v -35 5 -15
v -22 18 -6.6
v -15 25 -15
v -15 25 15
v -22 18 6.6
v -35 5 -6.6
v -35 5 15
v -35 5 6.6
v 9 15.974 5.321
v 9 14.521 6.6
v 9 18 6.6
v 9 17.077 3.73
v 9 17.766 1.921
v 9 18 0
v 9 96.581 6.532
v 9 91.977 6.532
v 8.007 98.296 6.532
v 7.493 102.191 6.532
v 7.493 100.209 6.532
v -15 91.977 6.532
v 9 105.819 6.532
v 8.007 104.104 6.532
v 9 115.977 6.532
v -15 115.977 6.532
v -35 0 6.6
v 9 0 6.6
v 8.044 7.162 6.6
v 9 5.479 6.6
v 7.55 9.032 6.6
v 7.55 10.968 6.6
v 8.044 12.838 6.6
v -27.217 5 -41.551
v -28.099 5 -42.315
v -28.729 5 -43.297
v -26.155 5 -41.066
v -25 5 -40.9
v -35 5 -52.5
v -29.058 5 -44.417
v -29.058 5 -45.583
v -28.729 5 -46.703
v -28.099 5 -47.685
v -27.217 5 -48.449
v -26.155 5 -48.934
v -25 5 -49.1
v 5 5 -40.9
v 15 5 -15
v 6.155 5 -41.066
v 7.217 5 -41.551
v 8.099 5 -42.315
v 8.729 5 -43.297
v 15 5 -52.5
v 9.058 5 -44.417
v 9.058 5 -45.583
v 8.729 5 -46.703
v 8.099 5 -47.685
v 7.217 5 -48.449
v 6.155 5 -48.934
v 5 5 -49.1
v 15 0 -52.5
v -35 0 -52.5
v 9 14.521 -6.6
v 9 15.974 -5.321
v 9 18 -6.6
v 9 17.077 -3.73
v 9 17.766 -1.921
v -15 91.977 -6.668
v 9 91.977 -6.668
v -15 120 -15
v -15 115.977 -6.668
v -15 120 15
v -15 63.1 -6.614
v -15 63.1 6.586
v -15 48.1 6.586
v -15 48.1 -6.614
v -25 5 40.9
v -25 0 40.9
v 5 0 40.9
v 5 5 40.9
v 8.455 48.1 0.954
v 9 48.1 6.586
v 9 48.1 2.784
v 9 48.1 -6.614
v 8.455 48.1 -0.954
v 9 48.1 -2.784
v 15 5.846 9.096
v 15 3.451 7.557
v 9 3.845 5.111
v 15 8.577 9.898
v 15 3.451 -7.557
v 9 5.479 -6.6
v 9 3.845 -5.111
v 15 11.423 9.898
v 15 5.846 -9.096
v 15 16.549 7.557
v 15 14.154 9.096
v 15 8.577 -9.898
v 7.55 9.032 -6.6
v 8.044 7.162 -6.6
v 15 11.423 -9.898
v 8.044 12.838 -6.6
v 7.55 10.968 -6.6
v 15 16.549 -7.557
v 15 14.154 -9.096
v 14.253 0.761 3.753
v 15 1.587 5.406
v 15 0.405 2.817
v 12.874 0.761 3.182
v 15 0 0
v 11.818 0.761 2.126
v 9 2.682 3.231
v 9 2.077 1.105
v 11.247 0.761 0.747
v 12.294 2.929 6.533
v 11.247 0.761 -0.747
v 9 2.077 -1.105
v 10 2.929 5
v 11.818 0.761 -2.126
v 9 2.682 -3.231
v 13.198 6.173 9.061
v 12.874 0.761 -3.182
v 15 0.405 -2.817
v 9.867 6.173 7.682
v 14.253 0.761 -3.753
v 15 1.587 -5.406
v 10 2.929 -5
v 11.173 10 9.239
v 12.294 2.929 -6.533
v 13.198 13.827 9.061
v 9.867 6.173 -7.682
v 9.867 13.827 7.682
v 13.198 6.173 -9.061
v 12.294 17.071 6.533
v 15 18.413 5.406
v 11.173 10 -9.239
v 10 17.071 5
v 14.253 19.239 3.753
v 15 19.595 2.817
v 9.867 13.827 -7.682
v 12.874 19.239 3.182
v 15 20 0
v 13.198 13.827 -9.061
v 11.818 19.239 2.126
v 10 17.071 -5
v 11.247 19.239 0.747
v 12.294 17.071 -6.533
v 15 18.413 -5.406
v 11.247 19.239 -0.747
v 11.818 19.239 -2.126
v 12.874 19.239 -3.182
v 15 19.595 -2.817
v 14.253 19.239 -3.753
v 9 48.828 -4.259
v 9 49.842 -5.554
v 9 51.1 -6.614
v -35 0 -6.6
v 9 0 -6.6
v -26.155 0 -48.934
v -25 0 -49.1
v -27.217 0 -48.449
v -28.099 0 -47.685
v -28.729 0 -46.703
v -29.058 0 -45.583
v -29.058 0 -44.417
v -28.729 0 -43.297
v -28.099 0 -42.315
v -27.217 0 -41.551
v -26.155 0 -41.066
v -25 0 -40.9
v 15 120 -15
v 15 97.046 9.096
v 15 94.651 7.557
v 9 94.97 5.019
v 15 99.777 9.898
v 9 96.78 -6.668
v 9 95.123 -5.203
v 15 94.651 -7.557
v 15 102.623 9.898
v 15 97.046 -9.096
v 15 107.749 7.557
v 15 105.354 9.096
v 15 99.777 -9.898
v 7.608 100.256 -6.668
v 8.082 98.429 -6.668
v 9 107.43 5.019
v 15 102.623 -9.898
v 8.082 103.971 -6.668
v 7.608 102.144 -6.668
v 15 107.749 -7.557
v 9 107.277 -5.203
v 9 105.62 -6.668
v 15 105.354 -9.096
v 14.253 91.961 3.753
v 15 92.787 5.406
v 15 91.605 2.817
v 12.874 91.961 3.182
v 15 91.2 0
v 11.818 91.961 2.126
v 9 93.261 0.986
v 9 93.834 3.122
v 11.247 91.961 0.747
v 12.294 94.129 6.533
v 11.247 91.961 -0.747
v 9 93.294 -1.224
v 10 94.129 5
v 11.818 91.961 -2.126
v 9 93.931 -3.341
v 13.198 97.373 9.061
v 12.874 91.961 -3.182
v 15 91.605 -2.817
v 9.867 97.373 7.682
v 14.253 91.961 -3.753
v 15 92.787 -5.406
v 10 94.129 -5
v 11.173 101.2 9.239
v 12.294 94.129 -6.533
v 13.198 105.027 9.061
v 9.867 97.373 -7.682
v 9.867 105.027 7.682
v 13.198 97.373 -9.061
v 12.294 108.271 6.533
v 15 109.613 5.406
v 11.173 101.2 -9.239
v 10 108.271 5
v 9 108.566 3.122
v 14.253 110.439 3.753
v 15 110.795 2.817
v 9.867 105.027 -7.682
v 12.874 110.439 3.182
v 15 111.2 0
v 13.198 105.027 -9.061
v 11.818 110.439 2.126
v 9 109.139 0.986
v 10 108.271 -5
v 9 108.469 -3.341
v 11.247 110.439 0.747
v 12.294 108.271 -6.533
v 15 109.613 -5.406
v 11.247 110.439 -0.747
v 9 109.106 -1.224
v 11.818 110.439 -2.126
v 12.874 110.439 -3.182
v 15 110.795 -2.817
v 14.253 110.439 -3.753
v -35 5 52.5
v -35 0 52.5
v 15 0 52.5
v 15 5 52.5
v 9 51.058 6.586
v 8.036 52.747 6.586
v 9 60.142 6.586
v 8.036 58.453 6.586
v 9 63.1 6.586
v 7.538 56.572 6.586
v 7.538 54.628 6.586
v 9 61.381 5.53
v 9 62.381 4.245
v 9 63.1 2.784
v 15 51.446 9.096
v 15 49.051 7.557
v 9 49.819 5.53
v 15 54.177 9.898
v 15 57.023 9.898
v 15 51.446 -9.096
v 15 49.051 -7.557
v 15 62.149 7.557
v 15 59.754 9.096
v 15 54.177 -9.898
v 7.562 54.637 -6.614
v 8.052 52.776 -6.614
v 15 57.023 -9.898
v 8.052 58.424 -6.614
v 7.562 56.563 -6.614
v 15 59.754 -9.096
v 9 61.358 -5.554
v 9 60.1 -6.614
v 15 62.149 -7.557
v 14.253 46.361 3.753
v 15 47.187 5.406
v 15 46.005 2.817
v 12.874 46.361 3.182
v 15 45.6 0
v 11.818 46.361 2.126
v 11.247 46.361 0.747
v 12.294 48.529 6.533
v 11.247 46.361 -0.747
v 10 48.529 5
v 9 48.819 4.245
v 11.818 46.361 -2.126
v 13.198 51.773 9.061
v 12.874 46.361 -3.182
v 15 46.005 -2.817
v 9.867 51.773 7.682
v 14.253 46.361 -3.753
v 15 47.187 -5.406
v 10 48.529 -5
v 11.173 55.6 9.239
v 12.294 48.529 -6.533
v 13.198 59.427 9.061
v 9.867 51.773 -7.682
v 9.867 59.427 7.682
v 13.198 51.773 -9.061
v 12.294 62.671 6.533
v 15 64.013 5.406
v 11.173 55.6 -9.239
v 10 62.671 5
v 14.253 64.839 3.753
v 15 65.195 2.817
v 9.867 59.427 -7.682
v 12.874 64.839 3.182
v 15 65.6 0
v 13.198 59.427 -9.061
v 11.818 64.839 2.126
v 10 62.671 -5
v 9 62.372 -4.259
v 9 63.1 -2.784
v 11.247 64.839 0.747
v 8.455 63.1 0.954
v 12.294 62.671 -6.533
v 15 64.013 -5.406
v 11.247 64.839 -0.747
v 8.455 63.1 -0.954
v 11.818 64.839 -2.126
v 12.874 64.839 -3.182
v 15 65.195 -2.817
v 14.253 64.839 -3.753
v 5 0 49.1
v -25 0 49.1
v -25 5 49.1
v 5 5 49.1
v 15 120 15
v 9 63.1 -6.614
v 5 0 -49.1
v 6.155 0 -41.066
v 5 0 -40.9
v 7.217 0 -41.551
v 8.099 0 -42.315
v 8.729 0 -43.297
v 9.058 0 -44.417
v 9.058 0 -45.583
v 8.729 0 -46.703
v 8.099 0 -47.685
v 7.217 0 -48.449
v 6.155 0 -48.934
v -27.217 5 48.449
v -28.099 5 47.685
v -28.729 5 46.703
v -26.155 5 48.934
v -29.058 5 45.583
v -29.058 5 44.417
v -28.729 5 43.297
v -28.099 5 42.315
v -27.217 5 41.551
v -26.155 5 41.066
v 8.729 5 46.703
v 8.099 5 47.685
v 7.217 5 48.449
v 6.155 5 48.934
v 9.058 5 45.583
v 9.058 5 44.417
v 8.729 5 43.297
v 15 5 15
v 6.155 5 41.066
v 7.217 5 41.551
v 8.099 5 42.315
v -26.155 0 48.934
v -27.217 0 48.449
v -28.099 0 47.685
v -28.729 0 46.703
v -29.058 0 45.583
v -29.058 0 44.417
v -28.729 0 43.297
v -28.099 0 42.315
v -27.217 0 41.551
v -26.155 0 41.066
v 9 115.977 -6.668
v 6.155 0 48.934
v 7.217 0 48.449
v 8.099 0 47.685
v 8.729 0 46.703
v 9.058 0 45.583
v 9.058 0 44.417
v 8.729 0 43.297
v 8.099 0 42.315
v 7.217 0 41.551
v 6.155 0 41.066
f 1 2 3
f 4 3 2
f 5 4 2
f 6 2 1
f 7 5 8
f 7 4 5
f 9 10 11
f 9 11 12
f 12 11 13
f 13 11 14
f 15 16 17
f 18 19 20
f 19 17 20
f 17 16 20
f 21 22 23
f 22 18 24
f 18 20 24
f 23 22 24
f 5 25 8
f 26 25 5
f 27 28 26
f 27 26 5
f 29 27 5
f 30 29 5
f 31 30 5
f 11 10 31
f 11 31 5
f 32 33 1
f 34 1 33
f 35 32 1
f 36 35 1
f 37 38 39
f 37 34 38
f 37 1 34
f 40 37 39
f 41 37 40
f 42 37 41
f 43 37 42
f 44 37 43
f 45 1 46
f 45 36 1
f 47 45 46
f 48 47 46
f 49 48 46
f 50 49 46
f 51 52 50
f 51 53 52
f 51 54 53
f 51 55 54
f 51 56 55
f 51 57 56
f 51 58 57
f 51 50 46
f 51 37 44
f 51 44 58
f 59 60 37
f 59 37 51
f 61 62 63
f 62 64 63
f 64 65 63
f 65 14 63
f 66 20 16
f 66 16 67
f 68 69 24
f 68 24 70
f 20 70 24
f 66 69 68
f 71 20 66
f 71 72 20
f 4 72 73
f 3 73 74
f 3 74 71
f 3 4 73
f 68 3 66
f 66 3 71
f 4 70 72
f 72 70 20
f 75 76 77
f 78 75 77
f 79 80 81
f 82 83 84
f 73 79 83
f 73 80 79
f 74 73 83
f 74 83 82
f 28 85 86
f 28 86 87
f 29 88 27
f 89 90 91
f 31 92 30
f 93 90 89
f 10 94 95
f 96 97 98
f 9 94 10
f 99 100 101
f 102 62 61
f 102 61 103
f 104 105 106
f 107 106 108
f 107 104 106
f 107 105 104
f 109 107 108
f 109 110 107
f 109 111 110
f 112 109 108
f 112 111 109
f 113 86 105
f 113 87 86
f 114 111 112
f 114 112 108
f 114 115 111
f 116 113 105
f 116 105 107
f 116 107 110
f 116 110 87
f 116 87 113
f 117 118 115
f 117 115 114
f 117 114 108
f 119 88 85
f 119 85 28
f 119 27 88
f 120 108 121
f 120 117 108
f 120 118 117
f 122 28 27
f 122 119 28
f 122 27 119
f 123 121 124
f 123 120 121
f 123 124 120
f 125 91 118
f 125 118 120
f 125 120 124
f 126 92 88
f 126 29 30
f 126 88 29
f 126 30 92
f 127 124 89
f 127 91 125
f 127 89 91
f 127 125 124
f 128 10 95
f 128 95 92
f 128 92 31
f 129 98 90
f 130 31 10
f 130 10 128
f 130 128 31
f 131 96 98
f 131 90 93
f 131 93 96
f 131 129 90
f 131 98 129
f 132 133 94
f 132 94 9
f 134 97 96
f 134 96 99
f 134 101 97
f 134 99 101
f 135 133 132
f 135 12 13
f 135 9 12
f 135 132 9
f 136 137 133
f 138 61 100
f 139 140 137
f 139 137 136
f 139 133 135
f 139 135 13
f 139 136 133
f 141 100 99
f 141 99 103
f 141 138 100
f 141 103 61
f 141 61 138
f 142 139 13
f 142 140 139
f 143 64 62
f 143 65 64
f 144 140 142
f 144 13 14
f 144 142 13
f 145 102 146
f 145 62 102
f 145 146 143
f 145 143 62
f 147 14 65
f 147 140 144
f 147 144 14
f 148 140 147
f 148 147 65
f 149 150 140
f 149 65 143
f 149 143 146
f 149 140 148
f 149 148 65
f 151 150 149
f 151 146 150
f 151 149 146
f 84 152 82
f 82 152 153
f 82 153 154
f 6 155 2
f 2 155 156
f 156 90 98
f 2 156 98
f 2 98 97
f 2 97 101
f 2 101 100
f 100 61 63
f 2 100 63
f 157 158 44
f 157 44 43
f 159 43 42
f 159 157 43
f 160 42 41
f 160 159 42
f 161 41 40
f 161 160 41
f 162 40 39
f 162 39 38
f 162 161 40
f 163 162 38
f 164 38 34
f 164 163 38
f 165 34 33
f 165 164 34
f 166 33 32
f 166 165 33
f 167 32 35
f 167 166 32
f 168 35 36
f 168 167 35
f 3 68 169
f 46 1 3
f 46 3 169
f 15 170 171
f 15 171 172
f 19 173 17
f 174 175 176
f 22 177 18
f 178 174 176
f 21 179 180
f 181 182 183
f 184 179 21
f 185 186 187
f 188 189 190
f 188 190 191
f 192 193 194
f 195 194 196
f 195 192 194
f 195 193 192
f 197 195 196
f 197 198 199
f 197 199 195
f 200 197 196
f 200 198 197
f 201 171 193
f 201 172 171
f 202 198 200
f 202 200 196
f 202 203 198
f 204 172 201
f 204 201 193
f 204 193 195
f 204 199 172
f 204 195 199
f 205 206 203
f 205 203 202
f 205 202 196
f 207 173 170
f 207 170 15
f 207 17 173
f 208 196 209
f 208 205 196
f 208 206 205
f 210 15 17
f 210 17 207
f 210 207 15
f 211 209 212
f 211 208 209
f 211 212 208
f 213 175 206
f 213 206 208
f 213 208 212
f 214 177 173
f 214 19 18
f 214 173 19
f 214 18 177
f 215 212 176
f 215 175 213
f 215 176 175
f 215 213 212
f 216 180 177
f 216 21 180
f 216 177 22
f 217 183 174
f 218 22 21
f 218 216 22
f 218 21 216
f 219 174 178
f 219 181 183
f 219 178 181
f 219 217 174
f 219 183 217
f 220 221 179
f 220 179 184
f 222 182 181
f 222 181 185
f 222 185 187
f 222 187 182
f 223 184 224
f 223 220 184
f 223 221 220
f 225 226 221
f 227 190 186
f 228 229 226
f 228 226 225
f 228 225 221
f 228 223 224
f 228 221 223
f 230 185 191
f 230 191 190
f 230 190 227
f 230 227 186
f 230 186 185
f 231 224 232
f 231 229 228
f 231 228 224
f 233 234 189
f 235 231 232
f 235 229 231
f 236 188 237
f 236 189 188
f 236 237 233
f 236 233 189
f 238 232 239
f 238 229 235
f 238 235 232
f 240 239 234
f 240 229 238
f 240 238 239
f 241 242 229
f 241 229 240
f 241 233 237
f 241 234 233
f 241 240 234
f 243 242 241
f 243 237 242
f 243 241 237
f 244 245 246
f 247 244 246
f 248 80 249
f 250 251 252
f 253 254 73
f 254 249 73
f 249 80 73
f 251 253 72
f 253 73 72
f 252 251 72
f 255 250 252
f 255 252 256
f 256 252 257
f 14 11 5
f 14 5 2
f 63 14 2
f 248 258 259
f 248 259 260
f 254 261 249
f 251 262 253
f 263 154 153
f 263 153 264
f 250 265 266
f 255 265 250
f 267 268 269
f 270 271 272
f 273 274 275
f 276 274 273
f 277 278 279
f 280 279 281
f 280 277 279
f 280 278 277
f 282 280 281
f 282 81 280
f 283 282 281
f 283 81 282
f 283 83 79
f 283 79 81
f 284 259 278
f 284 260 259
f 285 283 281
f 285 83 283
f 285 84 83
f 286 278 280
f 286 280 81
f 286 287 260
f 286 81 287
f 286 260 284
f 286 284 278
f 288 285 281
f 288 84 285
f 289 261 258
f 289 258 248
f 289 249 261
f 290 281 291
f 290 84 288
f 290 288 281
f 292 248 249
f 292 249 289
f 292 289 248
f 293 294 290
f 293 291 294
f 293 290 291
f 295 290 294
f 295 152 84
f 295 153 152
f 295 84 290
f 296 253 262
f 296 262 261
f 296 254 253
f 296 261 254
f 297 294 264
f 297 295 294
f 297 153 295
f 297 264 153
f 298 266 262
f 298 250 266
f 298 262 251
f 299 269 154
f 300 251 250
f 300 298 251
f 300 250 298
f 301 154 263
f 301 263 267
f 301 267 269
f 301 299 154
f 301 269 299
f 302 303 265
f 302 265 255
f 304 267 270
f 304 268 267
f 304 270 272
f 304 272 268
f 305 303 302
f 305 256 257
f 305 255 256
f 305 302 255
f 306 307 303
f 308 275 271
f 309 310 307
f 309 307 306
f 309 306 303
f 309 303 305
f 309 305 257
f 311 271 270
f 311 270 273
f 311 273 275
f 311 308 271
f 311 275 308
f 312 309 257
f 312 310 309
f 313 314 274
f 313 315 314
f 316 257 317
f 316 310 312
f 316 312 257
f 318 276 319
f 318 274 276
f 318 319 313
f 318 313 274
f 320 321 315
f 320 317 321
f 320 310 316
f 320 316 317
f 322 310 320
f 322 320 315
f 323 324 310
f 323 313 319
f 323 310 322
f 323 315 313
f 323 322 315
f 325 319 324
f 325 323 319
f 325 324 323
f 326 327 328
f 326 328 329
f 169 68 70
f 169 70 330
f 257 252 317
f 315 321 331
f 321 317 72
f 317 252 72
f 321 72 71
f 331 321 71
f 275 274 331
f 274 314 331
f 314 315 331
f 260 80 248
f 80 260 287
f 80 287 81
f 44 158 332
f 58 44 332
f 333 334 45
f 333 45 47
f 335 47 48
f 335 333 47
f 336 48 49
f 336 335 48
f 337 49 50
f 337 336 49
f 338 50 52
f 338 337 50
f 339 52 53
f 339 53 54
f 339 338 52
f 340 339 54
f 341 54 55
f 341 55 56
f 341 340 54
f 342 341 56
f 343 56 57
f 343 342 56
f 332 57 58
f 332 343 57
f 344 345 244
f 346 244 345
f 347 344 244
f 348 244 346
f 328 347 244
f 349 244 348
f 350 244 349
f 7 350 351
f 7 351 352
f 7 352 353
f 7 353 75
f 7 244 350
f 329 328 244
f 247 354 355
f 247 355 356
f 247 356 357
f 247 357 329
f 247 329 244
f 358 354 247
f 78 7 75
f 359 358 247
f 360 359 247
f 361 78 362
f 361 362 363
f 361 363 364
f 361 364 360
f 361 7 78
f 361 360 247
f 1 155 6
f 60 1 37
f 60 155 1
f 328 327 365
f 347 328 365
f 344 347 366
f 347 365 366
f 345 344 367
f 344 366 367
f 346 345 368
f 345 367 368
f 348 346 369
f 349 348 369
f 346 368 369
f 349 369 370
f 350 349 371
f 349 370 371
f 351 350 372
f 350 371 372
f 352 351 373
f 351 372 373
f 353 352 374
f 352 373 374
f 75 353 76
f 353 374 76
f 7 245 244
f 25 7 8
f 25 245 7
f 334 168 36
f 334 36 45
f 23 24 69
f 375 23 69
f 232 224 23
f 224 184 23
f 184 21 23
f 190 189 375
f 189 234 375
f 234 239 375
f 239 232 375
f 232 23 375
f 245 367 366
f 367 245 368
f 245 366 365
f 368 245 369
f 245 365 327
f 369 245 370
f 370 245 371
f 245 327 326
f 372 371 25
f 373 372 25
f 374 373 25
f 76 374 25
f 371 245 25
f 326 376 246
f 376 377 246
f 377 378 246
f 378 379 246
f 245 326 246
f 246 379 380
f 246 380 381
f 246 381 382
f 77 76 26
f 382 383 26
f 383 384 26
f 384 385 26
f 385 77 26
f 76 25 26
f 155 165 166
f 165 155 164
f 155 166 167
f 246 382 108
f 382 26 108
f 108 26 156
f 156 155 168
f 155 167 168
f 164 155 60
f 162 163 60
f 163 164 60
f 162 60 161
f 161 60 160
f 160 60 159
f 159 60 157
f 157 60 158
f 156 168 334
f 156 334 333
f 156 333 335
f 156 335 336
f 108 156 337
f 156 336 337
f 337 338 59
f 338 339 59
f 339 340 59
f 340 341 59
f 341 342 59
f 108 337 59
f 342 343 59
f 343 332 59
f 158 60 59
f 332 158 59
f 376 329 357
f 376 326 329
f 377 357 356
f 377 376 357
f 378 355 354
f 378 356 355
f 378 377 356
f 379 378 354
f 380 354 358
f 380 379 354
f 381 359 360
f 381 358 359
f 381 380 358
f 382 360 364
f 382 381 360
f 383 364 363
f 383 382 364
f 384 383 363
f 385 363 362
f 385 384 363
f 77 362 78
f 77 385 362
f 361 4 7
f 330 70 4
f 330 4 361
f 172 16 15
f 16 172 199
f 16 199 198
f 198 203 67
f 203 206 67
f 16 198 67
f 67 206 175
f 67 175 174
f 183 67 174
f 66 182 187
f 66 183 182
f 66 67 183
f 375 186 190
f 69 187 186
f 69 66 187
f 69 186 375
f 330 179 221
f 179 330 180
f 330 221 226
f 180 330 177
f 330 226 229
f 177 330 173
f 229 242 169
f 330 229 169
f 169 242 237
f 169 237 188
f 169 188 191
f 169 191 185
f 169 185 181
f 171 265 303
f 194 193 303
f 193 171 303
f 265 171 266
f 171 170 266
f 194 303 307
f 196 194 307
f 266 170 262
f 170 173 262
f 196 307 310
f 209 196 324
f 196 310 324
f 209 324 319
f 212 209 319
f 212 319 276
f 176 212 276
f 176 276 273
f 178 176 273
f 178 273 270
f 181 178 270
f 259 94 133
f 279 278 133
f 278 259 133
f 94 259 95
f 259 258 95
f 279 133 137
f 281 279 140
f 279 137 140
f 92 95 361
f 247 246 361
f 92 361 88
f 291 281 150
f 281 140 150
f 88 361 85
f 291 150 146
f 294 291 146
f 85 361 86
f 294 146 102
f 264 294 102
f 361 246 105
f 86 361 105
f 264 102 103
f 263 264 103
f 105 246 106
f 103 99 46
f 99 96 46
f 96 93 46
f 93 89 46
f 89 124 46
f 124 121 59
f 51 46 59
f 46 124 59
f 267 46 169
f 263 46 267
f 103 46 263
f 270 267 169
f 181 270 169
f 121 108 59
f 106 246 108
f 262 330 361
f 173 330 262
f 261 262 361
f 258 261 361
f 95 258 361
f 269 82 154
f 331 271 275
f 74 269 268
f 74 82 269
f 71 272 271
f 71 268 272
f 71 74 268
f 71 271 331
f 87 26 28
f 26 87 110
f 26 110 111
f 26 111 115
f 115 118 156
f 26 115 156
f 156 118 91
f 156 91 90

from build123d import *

# Parameters (mm, degrees)
SKETCH_1_W                      = 70
SKETCH_1_H                      = 105
EXTRUDE_1_DEPTH                 = 5
SKETCH_2_W                      = 30
SKETCH_2_H                      = 30
EXTRUDE_2_DEPTH                 = 120
EXTRUDE_3_REACH                 = 137.577
EXTRUDE_3_DIRECTION_2_REACH     = 137.577
SKETCH_8_R                      = 4.1
CUT_EXTRUDE_2_DEPTH             = 5
SKETCH_11_W                     = 20
SKETCH_11_H                     = 105
CUT_EXTRUDE_3_DEPTH             = 5
PATTERN_LINEAR_1_COUNT          = 3
PATTERN_LINEAR_1_PITCH          = 45.6
CUT_EXTRUDE_4_DEPTH             = 9
CUT_EXTRUDE_4_DEPTH_BACK        = 136.57746863
SKETCH_14_W                     = 13.2
SKETCH_14_H                     = 24
PATTERN_LINEAR_3_COUNT          = 2
PATTERN_LINEAR_3_PITCH          = 30
SKETCH_15_W                     = 30
SKETCH_15_H                     = 8.2
CUT_EXTRUDE_5_DEPTH             = 5
MIRROR_4_COPY_1_SKETCH_R        = 4.1
MIRROR_4_COPY_1_DEPTH           = 5
MIRROR_4_COPY_2_SKETCH_R        = 4.1
MIRROR_4_COPY_2_DEPTH           = 5
CUT_EXTRUDE_6_REACH             = 137.577
SKETCH_17_W                     = 13.2
SKETCH_17_H                     = 18
CUT_EXTRUDE_6_DIRECTION_2_DEPTH = 9
CUT_EXTRUDE_7_DEPTH             = 9
CUT_EXTRUDE_7_DEPTH_BACK        = 15
SKETCH_18_W                     = 13.2
SKETCH_18_H                     = 15


with BuildPart() as part:
    # 草图1 → 凸台-拉伸1 (new body)
    with BuildSketch(Plane(origin=(0, 0, 0), x_dir=(1, 0, 0), z_dir=(0, 1, 0))):
        Rectangle(SKETCH_1_W, SKETCH_1_H)
    extrude(amount=EXTRUDE_1_DEPTH)

    # 草图2 → 凸台-拉伸2 (add)
    with BuildSketch(Plane(origin=(0, 0, 0), x_dir=(1, 0, 0), z_dir=(0, 1, 0))):
        Rectangle(SKETCH_2_W, SKETCH_2_H)
    extrude(amount=EXTRUDE_2_DEPTH)

    # 凸台-拉伸3: up to this face of the body (flat: up to its plane)
    extrude_3_end = Plane(part.part.faces().sort_by_distance((0, 62.5, 15))[0])
    # 草图7 → 凸台-拉伸3 (add, up to the picked face)
    with BuildSketch(Plane.XY, mode=Mode.PRIVATE) as extrude_3_sk1:
        Polygon((-15, 25), (-35, 5), (-15, 5), align=None)
    extrude_3_tool1 = split(extrude(extrude_3_sk1.sketch, amount=EXTRUDE_3_REACH, mode=Mode.PRIVATE), bisect_by=extrude_3_end, keep=Keep.BOTH, mode=Mode.PRIVATE)
    add(extrude_3_tool1.solids().sort_by(Axis((-21.666667, 11.666667, 0), (0, 0, 1)))[0])

    # 凸台-拉伸3 direction 2: up to this face of the body (flat: up to its plane)
    extrude_3_direction_2_end = Plane(part.part.faces().sort_by_distance((0, 62.5, -15))[0])
    # 草图7 → 凸台-拉伸3 direction 2 (add, up to the picked face)
    with BuildSketch(Plane.XY, mode=Mode.PRIVATE) as extrude_3_direction_2_sk1:
        Polygon((-15, 25), (-35, 5), (-15, 5), align=None)
    extrude_3_direction_2_tool1 = split(extrude(extrude_3_direction_2_sk1.sketch, amount=-EXTRUDE_3_DIRECTION_2_REACH, mode=Mode.PRIVATE), bisect_by=extrude_3_direction_2_end, keep=Keep.BOTH, mode=Mode.PRIVATE)
    add(extrude_3_direction_2_tool1.solids().sort_by(Axis((-21.666667, 11.666667, 0), (0, 0, -1)))[0])

    # 草图8 → 切除-拉伸2 (cut)
    with BuildSketch(Plane(origin=(0, 0, 0), x_dir=(1, 0, 0), z_dir=(0, 1, 0))):
        with Locations(Location((-25, 45, 0), (0, 0, 270))):
            Circle(SKETCH_8_R)
    cut_extrude_2 = extrude(amount=CUT_EXTRUDE_2_DEPTH, mode=Mode.SUBTRACT)

    # 镜向2: 切除-拉伸2 across plane
    add(cut_extrude_2.mirror(Plane.XY), mode=Mode.SUBTRACT)

    # 草图11 → 切除-拉伸3 (cut)
    with BuildSketch(Plane(origin=(0, 0, 0), x_dir=(1, 0, 0), z_dir=(0, 1, 0))):
        with Locations((25, 0)):
            Rectangle(SKETCH_11_W, SKETCH_11_H)
    extrude(amount=CUT_EXTRUDE_3_DEPTH, mode=Mode.SUBTRACT)

    # 草图12 → 切除-旋转2 (revolve, cut)
    with BuildSketch(Plane.XY):
        with BuildLine():
            Line((15, 20), (15, 0))
            ThreePointArc((15, 0), (5, 10), (15, 20))
        make_face()
    cut_revolve_2 = revolve(axis=Axis((15, 20, 0), (0, -1, 0)), mode=Mode.SUBTRACT)

    # 阵列(线性)1: 切除-旋转2 ×3
    with Locations(*[(0, i * PATTERN_LINEAR_1_PITCH, 0) for i in range(1, PATTERN_LINEAR_1_COUNT)]):
        add(cut_revolve_2, mode=Mode.SUBTRACT)

    # 草图14 → 切除-拉伸4 (cut, two sides: drawn at the far end of the back side and taken through both)
    with BuildSketch(Plane(origin=(0, 0, 0), x_dir=(0, 0, -1), z_dir=(1, 0, 0)).offset(-CUT_EXTRUDE_4_DEPTH_BACK)):
        with Locations((0.067878733, 103.977253559)):
            Rectangle(SKETCH_14_W, SKETCH_14_H)
    extrude(amount=CUT_EXTRUDE_4_DEPTH + CUT_EXTRUDE_4_DEPTH_BACK, mode=Mode.SUBTRACT)

    # 阵列(线性)3: 切除-拉伸2 ×2
    with Locations(*[(i * PATTERN_LINEAR_3_PITCH, 0, 0) for i in range(1, PATTERN_LINEAR_3_COUNT)]):
        add(cut_extrude_2, mode=Mode.SUBTRACT)

    # 草图15 → 切除-拉伸5 (cut)
    with BuildSketch(Plane(origin=(0, 0, 0), x_dir=(1, 0, 0), z_dir=(0, 1, 0))):
        with Locations((-10, 45)):
            Rectangle(SKETCH_15_W, SKETCH_15_H)
    cut_extrude_5 = extrude(amount=CUT_EXTRUDE_5_DEPTH, mode=Mode.SUBTRACT)

    # 镜向3: 切除-拉伸5 across plane
    add(cut_extrude_5.mirror(Plane.XY), mode=Mode.SUBTRACT)

    # 镜向4 copy 1 sketch → 镜向4 copy 1 (cut)
    with BuildSketch(Plane(origin=(30, 0, 0), x_dir=(1, 0, 0), z_dir=(0, 1, 0))):
        with Locations((-25, -45)):
            Circle(MIRROR_4_COPY_1_SKETCH_R)
    extrude(amount=MIRROR_4_COPY_1_DEPTH, mode=Mode.SUBTRACT)

    # 镜向4 copy 2 sketch → 镜向4 copy 2 (cut)
    with BuildSketch(Plane(origin=(0, 0, 0), x_dir=(1, 0, 0), z_dir=(0, 1, 0))):
        with Locations((-25, -45)):
            Circle(MIRROR_4_COPY_2_SKETCH_R)
    extrude(amount=MIRROR_4_COPY_2_DEPTH, mode=Mode.SUBTRACT)

    # 切除-拉伸6: up to this plane
    cut_extrude_6_end = Plane(origin=(-15, 25, 43.284271247), z_dir=(0.7071067811865476, -0.7071067811865475, 0))
    # 草图17 → 切除-拉伸6 (cut, up to the surface)
    with BuildSketch(Plane(origin=(0, 0, 0), x_dir=(0, 0, -1), z_dir=(1, 0, 0)), mode=Mode.PRIVATE) as cut_extrude_6_sk1:
        with Locations((0, 9)):
            Rectangle(SKETCH_17_W, SKETCH_17_H)
    cut_extrude_6_tool1 = split(extrude(cut_extrude_6_sk1.sketch, amount=-CUT_EXTRUDE_6_REACH, mode=Mode.PRIVATE), bisect_by=cut_extrude_6_end, keep=Keep.BOTH, mode=Mode.PRIVATE)
    add(cut_extrude_6_tool1.solids().sort_by_distance((0, 9, 0))[0], mode=Mode.SUBTRACT)

    # 草图17 → 切除-拉伸6 direction 2 (cut)
    with BuildSketch(Plane(origin=(0, 0, 0), x_dir=(0, 0, -1), z_dir=(1, 0, 0))):
        with Locations((0, 9)):
            Rectangle(SKETCH_17_W, SKETCH_17_H)
    extrude(amount=CUT_EXTRUDE_6_DIRECTION_2_DEPTH, mode=Mode.SUBTRACT)

    # 草图18 → 切除-拉伸7 (cut, two sides: drawn at the far end of the back side and taken through both)
    with BuildSketch(Plane(origin=(0, 0, 0), x_dir=(0, 0, -1), z_dir=(1, 0, 0)).offset(-CUT_EXTRUDE_7_DEPTH_BACK)):
        with Locations((0.014378278, 55.6)):
            Rectangle(SKETCH_18_W, SKETCH_18_H)
    extrude(amount=CUT_EXTRUDE_7_DEPTH + CUT_EXTRUDE_7_DEPTH_BACK, mode=Mode.SUBTRACT)


solid = part.part
